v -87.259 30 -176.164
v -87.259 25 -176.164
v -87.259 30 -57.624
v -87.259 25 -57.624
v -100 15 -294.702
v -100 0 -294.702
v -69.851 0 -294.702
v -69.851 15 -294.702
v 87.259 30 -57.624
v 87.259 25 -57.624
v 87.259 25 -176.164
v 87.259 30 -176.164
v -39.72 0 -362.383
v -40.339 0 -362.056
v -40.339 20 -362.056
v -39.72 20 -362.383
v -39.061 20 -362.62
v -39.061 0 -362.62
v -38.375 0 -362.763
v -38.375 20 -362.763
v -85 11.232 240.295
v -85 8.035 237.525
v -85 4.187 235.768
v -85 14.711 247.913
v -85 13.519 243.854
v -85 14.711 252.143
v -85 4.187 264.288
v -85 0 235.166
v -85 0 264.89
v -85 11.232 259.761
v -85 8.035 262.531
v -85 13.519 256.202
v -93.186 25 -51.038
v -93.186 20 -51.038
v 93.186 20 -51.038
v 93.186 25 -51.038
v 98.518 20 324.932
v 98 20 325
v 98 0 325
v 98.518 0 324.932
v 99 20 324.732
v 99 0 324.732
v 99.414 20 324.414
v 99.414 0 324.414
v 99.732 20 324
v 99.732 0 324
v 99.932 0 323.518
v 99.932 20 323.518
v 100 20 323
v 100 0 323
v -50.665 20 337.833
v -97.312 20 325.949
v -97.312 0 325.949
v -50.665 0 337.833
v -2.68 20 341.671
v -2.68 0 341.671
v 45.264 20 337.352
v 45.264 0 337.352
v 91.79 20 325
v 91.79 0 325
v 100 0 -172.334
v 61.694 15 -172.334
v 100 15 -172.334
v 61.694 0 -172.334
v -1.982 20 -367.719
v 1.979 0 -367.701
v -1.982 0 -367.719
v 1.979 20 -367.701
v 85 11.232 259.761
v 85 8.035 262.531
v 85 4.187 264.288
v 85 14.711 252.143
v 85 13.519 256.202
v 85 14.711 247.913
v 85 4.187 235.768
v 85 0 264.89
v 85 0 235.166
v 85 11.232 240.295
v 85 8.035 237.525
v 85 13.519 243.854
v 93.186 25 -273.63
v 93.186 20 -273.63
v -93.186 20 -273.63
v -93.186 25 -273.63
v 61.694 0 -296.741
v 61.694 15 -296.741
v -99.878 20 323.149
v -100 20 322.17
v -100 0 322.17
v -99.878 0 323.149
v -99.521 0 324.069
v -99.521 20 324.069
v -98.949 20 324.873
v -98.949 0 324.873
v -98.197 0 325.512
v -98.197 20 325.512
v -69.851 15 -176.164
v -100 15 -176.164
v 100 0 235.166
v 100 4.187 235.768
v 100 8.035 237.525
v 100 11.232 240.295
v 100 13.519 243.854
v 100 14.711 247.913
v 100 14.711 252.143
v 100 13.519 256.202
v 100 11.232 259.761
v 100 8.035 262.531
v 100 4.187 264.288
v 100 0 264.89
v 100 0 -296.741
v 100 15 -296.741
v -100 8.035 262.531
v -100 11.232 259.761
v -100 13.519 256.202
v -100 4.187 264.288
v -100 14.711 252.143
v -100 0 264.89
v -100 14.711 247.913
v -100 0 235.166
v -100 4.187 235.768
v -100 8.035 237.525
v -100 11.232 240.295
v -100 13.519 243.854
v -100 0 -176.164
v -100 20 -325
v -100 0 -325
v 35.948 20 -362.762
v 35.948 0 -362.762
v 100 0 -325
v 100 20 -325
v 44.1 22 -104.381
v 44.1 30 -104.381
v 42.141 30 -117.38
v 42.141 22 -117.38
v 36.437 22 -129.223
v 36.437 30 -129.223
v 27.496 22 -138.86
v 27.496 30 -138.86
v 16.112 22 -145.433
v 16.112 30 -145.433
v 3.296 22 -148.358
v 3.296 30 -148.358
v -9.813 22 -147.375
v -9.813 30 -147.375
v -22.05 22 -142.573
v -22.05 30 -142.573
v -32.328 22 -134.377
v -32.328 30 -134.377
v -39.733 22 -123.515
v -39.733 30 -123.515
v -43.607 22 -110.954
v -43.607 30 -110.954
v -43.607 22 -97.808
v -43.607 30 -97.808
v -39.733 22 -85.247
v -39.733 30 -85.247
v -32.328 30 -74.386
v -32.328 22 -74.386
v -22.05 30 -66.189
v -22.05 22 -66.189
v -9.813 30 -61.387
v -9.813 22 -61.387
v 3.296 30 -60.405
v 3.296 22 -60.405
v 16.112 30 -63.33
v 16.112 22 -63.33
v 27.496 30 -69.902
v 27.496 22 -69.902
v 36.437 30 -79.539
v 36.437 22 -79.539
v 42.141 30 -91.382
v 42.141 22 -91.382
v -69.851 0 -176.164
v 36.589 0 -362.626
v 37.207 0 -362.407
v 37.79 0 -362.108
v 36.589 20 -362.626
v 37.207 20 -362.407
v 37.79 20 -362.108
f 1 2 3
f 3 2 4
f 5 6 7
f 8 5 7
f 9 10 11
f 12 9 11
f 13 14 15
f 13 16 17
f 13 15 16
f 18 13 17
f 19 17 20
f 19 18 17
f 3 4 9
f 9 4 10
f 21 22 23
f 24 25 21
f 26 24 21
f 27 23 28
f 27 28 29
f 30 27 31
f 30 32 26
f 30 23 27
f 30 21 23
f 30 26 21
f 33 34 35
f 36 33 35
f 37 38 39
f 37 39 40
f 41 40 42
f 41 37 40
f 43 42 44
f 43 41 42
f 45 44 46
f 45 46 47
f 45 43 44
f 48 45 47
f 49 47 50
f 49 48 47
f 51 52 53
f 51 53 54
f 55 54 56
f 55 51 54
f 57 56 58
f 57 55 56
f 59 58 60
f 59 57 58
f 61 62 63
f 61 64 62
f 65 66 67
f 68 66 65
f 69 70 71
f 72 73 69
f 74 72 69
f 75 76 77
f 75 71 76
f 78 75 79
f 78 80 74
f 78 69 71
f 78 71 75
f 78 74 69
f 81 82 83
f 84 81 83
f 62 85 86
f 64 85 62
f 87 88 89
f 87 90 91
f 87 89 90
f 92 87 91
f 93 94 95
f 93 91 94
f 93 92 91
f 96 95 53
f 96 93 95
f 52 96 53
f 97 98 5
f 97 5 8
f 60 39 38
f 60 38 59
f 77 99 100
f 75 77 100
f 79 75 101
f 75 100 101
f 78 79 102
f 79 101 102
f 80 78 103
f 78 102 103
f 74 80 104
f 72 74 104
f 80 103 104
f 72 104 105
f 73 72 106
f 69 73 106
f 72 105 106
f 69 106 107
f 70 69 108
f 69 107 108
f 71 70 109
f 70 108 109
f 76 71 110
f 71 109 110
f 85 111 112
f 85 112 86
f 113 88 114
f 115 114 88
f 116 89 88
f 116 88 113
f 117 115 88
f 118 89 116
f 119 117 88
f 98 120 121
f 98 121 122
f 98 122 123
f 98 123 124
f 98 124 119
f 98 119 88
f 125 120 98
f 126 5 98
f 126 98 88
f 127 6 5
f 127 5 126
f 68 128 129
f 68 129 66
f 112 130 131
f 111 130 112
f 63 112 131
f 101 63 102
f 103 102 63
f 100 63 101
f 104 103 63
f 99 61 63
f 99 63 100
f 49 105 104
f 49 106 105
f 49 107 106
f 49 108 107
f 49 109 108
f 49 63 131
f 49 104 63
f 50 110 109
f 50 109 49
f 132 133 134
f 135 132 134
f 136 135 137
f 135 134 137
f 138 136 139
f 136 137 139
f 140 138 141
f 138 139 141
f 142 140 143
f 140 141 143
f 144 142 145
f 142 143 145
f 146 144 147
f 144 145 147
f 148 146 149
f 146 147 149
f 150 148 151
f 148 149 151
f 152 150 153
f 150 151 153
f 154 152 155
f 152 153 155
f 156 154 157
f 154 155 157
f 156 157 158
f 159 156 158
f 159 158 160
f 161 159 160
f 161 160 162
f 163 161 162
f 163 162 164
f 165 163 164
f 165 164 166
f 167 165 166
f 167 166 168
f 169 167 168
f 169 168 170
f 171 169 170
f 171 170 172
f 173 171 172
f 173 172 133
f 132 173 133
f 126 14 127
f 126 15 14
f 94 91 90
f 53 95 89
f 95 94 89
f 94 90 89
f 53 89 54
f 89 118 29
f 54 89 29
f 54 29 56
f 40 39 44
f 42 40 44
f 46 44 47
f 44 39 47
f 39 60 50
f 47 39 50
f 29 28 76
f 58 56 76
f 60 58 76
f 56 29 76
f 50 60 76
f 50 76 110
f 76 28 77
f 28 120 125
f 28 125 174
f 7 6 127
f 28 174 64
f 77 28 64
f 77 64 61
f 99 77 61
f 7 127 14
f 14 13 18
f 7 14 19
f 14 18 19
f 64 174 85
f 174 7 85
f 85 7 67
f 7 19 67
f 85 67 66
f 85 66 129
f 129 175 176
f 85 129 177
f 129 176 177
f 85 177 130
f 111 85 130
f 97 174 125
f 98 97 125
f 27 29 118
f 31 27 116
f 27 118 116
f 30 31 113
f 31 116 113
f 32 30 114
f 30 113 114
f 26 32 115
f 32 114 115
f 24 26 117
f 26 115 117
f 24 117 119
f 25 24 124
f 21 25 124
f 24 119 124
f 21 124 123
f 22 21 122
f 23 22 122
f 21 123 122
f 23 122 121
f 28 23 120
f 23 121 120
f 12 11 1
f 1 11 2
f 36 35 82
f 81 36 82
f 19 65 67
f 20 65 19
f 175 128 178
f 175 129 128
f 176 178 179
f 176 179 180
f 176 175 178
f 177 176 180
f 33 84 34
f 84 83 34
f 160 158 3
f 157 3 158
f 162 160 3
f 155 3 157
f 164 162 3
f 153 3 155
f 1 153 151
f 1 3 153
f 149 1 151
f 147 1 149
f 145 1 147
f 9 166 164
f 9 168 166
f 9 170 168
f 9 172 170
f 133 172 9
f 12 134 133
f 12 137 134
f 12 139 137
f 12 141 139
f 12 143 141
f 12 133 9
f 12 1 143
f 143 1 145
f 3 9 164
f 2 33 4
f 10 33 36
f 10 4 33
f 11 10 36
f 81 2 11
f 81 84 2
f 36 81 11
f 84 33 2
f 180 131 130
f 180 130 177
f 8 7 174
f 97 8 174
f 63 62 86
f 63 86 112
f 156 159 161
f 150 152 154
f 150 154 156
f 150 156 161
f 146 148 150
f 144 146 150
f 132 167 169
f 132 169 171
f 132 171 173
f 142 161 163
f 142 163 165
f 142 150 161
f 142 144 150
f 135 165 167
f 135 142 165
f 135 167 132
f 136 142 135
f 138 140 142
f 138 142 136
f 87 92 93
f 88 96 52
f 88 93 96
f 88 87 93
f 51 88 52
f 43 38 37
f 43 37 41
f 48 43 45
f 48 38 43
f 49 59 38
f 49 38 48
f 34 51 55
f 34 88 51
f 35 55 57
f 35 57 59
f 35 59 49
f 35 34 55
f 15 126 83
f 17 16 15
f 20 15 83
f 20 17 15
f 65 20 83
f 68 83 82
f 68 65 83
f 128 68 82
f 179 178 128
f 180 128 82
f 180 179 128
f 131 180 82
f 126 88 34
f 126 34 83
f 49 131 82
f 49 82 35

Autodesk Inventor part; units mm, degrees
ref_plane "YZ Plane" through (0, 0, 0) normal (1, 0, 0) x (0, 1, 0)
ref_plane "XZ Plane" through (0, 0, 0) normal (0, 1, 0) x (-1, 0, 0)
ref_plane "XY Plane" through (0, 0, 0) normal (0, 0, 1) x (1, 0, 0)
sketch "Sketch1" plane through (0, 0, 0) normal (0, 1, 0) x (-1, 0, 0)
  line L0 (-100, 325) -> (100, 325)
  line L1 (100, 325) -> (100, -325)
  line L2 (100, -325) -> (-100, -325)
  line L3 (-100, -325) -> (-100, 325)
  line L4 (-100, 325) -> (100, -325) construction
  line L5 (100, 325) -> (-100, -325) construction
  point P0 (0, 0)
  dimension "d0" = 200
  dimension "d1" = 650
sketch "Sketch2" plane through (0, 0, 0) normal (0, 1, 0) x (-1, 0, 0)
  point P0 (0, 0)
extrude "Extrusion1" add sketch "Sketch1" along normal blind 20
sketch "Sketch3" plane through (0, 20, 0) normal (0, 1, 0) x (1, 0, 0)
  line L0 (-100, -325) -> (100, -325) projected
  arc A0 (-100, -325) -> (91.7903, -325) centre (-4.1048, -57.5933) ccw
  point P0 (0, 0)
extrude "Extrusion2" add sketch "Sketch3" against normal blind 20
sketch "Sketch4" plane through (0, 20, 0) normal (0, 1, 0) x (1, 0, 0)
  line L0 (100, 325) -> (-100, 325) projected
  line L1 (100, 325) -> (36.9346, 362.619)
  line L2 (36.9346, 362.619) -> (0, 367.9885)
  line L3 (0, 367.9885) -> (-39.4325, 362.619)
  line L4 (-39.4325, 362.619) -> (-100, 325)
  point P0 (0, 0)
extrude "Extrusion3" add sketch "Sketch4" against normal blind 20
fillet "Fillet1" radius 2 1 edges at (100, 10, 325)
fillet "Fillet2" radius 4 1 edges at (-100, 10, 325)
chamfer "Chamfer1" distance 2 angle 45 1 edges at (0, 10, -367.9885)
fillet "Fillet3" radius 5 1 edges at (36.9346, 10, -362.619)
fillet "Fillet4" radius 5 1 edges at (-39.4325, 10, -362.619)
sketch "Sketch5" plane through (0, 20, 0) normal (0, 1, 0) x (1, 0, 0)
  line L0 (0, 22.7202) -> (-100, 22.7202)
  line L1 (-100, 325) -> (-100, -322.17) projected
  line L2 (0, 22.7202) -> (99.1127, 22.7202)
  line L3 (99.1127, 22.7202) -> (-100, 22.7202)
  point P0 (0, 0)
sketch "Sketch6" plane through (0, 20, 0) normal (0, 1, 0) x (1, 0, 0)
  line L0 (93.1857, 273.63) -> (-93.1857, 273.63)
  line L1 (-93.1857, 273.63) -> (-93.1857, 51.0381)
  line L2 (-93.1857, 51.0381) -> (93.1857, 51.0381)
  line L3 (93.1857, 51.0381) -> (93.1857, 273.63)
  line L4 (93.1857, 273.63) -> (-93.1857, 51.0381) construction
  line L5 (-93.1857, 273.63) -> (93.1857, 51.0381) construction
  point P0 (0, 0)
  point P1 (0, 162.334)
extrude "Extrusion4" add sketch "Sketch6" along normal blind 5
sketch "Sketch7" plane through (0, 25, 0) normal (0, 1, 0) x (1, 0, 0)
  line L0 (87.2587, 176.1637) -> (-87.2587, 176.1637)
  line L1 (-87.2587, 176.1637) -> (-87.2587, 57.6236)
  line L2 (-87.2587, 57.6236) -> (87.2587, 57.6236)
  line L3 (87.2587, 57.6236) -> (87.2587, 176.1637)
  line L4 (87.2587, 176.1637) -> (-87.2587, 57.6236) construction
  line L5 (-87.2587, 176.1637) -> (87.2587, 57.6236) construction
  point P0 (0, 0)
  point P1 (0, 116.8937)
extrude "Extrusion5" add sketch "Sketch7" along normal blind 5
sketch "Sketch8" plane through (0, 30, 0) normal (0, 1, 0) x (1, 0, 0)
  circle A0 centre (0, 104.3811) radius 44.0999
  point P0 (0, 0)
extrude "Extrusion6" cut sketch "Sketch8" against normal blind 8
sketch "Sketch9" plane through (0, 30, 0) normal (0, 1, 0) x (1, 0, 0)
  circle A0 centre (-34.3381, 145.486) radius 4.7269
  point P0 (0, 0)
sketch "Sketch10" plane through (0, 0, 0) normal (0, -1, 0) x (1, 0, 0)
  line L0 (100, 323) -> (100, -325) projected
  line L1 (100, -296.7409) -> (61.6936, -296.7409)
  line L2 (61.6936, -296.7409) -> (61.6936, -172.3341)
  line L3 (61.6936, -172.3341) -> (100, -172.3341)
  line L4 (100, -172.3341) -> (100, -296.7409)
  point P0 (0, 0)
extrude "Extrusion7" cut sketch "Sketch10" against normal blind 15
sketch "Sketch11" plane through (0, 0, 0) normal (0, -1, 0) x (1, 0, 0)
  line L0 (-100, -325) -> (-100, 322.17) projected
  line L1 (-87.2587, -176.1637) -> (87.2587, -176.1637) projected
  line L2 (-100, -294.7015) -> (-69.8514, -294.7015)
  line L3 (-69.8514, -294.7015) -> (-69.8514, -176.1637)
  line L4 (-69.8514, -176.1637) -> (-100, -176.1637)
  line L5 (-100, -176.1637) -> (-100, -294.7015)
  point P0 (0, 0)
extrude "Extrusion8" cut sketch "Sketch11" against normal blind 15
sketch "Sketch12" plane through (100, 0, -325) normal (1, 0, 0) x (0, 0, -1)
  circle A0 centre (-575.0278, 0) radius 14.8623
  point P0 (-325, 0)
extrude "Extrusion9" cut sketch "Sketch12" against normal blind 15
sketch "Sketch13" plane through (-100, 0, -325) normal (-1, 0, 0) x (0, 0, 1)
  line L0 (560.1655, 0) -> (589.8902, 0) projected
  circle A0 centre (575.0278, 0) radius 14.8623
  point P0 (325, 0)
extrude "Extrusion10" cut sketch "Sketch13" against normal blind 15
properties part number "BASE"
